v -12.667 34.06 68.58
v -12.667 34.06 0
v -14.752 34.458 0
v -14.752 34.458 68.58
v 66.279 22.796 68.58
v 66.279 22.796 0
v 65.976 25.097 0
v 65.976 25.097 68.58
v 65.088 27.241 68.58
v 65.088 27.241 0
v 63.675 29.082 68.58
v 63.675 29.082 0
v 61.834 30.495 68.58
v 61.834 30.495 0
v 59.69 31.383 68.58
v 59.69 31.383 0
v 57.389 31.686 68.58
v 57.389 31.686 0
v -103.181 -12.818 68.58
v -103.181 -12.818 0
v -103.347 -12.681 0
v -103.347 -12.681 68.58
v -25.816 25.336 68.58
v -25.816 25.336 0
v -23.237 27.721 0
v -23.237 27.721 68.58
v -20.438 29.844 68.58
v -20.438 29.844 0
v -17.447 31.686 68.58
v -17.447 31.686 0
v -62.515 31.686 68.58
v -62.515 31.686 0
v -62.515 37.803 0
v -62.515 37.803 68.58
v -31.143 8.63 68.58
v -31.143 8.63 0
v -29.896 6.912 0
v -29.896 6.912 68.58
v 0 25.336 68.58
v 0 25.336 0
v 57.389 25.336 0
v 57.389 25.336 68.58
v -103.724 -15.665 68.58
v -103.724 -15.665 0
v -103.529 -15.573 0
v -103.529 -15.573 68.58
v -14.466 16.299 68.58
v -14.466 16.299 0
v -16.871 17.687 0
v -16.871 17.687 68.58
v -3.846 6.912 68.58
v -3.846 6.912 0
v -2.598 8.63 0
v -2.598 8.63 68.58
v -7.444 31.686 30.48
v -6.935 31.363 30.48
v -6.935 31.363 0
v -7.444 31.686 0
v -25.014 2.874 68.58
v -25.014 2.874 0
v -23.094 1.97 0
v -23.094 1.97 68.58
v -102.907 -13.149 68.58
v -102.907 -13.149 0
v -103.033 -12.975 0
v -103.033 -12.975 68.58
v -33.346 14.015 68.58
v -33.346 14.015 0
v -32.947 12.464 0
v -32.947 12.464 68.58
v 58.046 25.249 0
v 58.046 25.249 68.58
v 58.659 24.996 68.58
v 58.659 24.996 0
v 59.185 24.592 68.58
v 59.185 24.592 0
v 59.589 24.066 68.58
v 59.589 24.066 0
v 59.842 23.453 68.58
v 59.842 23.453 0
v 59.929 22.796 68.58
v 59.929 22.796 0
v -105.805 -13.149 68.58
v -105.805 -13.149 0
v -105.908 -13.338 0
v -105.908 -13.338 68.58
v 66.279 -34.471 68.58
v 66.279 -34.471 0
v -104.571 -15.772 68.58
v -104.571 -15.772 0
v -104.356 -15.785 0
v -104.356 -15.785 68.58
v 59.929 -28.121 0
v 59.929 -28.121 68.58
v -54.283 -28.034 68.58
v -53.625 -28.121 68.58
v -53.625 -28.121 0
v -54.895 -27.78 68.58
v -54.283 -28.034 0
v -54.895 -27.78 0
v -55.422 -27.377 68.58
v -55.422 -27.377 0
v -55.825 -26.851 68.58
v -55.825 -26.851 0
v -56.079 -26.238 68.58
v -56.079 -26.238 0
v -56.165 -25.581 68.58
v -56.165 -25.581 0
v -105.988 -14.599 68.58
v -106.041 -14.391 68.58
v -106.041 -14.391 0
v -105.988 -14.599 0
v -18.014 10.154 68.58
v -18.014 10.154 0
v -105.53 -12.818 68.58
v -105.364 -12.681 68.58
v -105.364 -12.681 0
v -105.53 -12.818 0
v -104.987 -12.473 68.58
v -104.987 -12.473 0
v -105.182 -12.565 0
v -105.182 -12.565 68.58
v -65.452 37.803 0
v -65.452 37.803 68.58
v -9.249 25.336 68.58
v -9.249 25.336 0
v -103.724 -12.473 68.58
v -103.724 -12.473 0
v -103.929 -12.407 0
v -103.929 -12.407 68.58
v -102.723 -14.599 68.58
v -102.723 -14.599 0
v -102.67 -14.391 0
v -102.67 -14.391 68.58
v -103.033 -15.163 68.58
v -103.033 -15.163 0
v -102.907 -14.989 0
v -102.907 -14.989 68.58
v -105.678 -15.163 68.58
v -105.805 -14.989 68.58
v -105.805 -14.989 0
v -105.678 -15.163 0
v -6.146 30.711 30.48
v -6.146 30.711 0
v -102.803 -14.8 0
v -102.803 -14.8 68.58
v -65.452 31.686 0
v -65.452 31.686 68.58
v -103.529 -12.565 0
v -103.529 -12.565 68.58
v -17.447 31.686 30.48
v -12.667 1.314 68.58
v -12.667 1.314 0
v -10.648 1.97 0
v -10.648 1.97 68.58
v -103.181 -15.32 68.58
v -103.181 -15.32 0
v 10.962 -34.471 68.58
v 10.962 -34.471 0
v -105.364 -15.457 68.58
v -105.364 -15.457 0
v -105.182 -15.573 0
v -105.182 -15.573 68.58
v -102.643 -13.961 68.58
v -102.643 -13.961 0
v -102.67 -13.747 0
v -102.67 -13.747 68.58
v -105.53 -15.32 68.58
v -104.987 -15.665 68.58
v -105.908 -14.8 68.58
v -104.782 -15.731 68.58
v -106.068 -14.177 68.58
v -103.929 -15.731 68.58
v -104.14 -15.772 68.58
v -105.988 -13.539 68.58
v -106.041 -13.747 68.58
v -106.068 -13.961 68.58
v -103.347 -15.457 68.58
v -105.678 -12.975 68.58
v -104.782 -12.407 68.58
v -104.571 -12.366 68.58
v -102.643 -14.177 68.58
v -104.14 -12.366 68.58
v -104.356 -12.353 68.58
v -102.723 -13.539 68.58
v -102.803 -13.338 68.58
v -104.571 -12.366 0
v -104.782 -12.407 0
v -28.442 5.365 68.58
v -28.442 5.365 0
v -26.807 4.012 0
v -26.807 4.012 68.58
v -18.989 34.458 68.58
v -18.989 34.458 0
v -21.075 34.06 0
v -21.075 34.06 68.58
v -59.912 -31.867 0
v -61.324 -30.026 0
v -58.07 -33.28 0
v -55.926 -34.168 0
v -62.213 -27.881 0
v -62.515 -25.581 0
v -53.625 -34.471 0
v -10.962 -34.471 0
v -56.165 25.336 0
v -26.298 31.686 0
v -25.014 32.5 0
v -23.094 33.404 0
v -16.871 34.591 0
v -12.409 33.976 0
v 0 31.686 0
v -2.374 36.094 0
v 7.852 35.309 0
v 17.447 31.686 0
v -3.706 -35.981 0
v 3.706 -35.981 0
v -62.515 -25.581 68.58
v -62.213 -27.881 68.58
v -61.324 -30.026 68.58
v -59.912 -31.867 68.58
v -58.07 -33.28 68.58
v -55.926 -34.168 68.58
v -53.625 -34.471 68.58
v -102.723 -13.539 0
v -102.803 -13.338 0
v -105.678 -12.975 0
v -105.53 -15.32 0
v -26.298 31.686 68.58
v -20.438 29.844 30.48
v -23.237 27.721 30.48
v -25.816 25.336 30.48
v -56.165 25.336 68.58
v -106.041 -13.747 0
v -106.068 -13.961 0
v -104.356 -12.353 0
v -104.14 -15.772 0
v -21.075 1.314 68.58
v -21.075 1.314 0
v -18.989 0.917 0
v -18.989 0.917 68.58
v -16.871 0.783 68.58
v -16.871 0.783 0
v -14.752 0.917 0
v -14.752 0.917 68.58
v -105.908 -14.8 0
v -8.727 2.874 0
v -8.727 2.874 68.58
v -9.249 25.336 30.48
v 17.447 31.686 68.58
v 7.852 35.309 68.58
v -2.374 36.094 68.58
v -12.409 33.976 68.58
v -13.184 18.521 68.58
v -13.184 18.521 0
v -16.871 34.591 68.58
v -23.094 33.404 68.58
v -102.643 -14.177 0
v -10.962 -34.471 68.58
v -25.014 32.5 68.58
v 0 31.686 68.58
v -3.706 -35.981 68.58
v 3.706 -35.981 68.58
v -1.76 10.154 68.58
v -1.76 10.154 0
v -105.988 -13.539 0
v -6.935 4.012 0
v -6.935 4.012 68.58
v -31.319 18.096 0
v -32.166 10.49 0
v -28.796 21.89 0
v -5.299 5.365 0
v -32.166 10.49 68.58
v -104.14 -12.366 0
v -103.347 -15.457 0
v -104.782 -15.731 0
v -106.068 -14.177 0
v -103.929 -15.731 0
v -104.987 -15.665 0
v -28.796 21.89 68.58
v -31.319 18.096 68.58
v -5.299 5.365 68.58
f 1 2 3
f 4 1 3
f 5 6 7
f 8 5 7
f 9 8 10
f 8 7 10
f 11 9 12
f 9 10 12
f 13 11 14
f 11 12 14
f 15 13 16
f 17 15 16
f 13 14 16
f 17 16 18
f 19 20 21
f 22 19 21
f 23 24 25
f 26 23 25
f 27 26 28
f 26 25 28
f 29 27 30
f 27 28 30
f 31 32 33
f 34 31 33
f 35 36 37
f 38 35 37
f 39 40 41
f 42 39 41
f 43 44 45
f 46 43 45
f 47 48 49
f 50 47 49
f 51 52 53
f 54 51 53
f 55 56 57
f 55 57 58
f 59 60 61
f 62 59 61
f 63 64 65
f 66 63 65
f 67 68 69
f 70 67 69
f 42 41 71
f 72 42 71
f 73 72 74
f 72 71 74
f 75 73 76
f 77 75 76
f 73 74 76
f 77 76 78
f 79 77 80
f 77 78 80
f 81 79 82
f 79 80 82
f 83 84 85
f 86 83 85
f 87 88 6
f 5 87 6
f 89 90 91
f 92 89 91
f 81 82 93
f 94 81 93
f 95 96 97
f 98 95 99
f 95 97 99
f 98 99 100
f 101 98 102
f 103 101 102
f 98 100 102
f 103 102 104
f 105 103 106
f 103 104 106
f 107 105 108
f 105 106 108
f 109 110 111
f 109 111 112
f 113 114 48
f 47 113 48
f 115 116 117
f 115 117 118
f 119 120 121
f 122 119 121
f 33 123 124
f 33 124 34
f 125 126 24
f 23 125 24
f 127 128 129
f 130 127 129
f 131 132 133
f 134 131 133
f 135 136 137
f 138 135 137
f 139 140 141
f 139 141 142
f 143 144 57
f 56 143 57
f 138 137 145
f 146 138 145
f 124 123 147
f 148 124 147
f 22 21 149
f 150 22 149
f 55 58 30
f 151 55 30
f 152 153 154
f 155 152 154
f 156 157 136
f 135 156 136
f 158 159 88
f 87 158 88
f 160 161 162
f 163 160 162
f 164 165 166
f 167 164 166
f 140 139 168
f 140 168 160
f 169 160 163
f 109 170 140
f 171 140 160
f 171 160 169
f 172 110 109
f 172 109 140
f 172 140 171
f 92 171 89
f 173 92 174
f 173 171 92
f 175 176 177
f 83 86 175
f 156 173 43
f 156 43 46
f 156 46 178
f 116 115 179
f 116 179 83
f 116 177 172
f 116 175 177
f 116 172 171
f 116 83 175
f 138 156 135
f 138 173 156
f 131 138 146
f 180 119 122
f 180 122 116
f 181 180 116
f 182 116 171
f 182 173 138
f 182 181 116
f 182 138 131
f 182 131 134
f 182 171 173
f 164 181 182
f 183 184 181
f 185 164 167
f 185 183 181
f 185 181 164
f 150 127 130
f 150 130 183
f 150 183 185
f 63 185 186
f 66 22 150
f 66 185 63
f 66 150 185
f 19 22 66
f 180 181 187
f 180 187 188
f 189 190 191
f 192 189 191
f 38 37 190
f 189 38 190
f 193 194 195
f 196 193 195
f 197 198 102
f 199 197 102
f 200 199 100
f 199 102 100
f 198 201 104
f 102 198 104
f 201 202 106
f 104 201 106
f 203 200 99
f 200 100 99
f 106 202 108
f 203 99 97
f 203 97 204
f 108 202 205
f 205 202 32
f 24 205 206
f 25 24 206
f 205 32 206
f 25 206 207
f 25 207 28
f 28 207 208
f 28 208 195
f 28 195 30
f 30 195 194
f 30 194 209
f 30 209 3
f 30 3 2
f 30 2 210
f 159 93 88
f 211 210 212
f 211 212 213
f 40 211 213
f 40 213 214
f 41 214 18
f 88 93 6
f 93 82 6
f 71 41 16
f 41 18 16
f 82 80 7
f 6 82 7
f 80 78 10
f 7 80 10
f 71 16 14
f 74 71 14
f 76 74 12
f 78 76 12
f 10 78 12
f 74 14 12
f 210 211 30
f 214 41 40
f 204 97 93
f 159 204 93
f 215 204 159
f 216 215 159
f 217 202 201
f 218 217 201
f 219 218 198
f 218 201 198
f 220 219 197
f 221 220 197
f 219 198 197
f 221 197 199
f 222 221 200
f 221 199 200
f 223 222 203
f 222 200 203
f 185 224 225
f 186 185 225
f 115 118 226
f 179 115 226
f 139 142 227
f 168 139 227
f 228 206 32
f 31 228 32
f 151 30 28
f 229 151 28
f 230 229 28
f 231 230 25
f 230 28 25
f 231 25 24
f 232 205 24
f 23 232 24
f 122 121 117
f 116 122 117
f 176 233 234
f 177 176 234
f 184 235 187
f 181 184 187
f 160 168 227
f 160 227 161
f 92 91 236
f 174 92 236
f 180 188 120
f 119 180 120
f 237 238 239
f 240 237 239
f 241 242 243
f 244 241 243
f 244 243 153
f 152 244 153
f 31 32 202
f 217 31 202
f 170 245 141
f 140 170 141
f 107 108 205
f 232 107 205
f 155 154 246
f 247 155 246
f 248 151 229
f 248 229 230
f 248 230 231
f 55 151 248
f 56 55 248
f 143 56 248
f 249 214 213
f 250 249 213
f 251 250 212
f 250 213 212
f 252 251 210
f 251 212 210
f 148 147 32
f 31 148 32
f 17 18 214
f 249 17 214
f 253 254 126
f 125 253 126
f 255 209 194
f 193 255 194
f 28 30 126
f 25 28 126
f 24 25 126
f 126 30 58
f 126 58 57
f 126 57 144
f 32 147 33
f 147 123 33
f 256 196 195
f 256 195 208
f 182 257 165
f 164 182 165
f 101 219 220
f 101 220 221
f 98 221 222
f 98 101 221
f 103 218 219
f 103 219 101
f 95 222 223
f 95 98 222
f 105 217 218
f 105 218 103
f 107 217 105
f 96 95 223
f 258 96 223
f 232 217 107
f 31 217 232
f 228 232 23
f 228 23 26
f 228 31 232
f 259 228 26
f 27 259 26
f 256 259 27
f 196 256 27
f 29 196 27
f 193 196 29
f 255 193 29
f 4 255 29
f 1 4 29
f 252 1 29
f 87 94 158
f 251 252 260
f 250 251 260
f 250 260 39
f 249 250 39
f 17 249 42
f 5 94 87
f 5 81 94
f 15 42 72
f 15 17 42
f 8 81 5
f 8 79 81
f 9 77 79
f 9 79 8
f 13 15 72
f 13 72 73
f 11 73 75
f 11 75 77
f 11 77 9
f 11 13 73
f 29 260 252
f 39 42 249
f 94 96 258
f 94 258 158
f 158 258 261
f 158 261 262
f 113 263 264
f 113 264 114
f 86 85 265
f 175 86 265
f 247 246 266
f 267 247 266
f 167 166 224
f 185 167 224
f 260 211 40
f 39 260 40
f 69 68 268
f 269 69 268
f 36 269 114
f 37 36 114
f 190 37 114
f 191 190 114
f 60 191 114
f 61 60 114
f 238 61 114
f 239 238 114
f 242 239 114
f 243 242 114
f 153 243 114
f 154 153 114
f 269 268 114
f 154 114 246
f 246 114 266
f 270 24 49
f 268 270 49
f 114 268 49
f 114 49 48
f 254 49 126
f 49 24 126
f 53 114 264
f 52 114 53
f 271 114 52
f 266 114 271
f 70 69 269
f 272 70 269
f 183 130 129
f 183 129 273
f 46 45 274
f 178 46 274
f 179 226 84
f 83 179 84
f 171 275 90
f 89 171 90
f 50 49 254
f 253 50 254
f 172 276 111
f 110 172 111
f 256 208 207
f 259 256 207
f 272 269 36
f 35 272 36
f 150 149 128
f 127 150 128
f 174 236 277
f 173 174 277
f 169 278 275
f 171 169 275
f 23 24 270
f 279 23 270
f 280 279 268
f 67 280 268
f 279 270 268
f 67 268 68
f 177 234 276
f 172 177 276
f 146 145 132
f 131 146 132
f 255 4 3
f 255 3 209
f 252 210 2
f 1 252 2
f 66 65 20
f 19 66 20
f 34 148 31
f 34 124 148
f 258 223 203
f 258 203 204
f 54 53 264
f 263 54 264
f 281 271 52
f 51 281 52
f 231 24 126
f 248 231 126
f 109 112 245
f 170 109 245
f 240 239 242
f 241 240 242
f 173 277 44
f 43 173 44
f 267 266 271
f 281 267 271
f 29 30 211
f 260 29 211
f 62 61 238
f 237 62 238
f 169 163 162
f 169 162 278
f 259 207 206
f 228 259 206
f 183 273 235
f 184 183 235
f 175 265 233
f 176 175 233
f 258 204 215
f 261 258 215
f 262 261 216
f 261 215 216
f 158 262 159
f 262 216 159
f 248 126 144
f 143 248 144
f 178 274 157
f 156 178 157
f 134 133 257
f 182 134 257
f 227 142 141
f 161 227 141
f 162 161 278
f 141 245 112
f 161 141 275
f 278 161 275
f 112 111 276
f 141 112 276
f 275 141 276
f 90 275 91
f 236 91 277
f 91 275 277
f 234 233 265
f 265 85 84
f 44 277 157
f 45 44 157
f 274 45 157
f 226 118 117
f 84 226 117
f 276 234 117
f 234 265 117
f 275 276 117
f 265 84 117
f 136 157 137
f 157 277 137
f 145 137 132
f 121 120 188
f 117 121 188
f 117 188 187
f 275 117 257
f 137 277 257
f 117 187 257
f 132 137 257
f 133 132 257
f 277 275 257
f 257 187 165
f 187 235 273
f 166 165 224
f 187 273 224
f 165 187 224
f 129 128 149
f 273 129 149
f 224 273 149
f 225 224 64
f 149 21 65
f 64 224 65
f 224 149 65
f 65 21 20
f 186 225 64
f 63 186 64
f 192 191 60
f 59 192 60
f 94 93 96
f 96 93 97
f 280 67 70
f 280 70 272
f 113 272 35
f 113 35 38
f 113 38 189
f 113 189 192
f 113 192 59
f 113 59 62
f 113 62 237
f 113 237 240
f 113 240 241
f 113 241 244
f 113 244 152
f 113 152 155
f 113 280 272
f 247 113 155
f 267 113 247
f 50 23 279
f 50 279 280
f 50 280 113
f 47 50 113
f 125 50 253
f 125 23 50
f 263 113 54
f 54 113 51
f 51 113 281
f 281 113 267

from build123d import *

# Parameters (mm, degrees)
F1_DEPTH = 25.4
F0_W     = 2.9361471534
F0_H     = 3.0584856868
F2_DEPTH = 25.4
F3_DEPTH = 68.58
F4_DEPTH = 30.48


# Not quite as in the source:
# - the program builds the solid bodies; features that only make, move or delete a surface that nothing else refers to are left out


with BuildPart() as f1:
    # F0 (on Top) → F1 (new body)
    with BuildSketch(Plane.XY):
        Polygon((-62.5154599547, 0), (-56.1654599547, 0), (-56.1654599547, 25.3359185696), (-31.9179130904, 25.3359185696), (-31.1432781089, 26.7449743701), (-29.895510103, 28.4623796944), (-28.4423331579, 30.0098559658), (-26.8066647421, 31.3629985591), (-26.2978242266, 31.6859185696), (-62.5154599547, 31.6859185696), align=None)
    extrude(amount=F1_DEPTH)

    # F0 (on Top) → F2 (join)
    with BuildSketch(Plane.XY):
        with BuildLine():
            Line((0, 25.3359185696), (25.8161057919, 25.3359185696))
            ThreePointArc((25.8161057919, 25.3359185696), (21.8631038448, 28.8163977328), (17.4465656341, 31.6859185696))
            Line((17.4465656341, 31.6859185696), (0, 31.6859185696))
            Line((0, 31.6859185696), (0, 25.3359185696))
        make_face()
        with BuildLine():
            ThreePointArc((17.4465656341, 31.6859185696), (21.8631038448, 28.8163977328), (25.8161057919, 25.3359185696))
            Line((25.8161057919, 25.3359185696), (57.3888527393, 25.3359185696))
            ThreePointArc((57.3888527393, 25.3359185696), (59.1849039635, 24.5919697938), (59.9288527393, 22.7959185696))
            Line((59.9288527393, 22.7959185696), (59.9288527393, 0))
            Line((59.9288527393, 0), (66.2788527393, 0))
            Line((66.2788527393, 0), (66.2788527393, 22.7959185696))
            ThreePointArc((66.2788527393, 22.7959185696), (63.6750320241, 29.0820978543), (57.3888527393, 31.6859185696))
            Line((57.3888527393, 31.6859185696), (17.4465656341, 31.6859185696))
        make_face()
        with BuildLine():
            Line((59.9288527393, -28.1205956364), (22.7510920415, -28.1205956364))
            ThreePointArc((22.7510920415, -28.1205956364), (17.1527881407, -31.8459094237), (10.9616661369, -34.4705956364))
            Line((10.9616661369, -34.4705956364), (66.2788527393, -34.4705956364))
            Line((66.2788527393, -34.4705956364), (66.2788527393, 0))
            Line((66.2788527393, 0), (59.9288527393, 0))
            Line((59.9288527393, 0), (59.9288527393, -28.1205956364))
        make_face()
        with BuildLine():
            ThreePointArc((10.9616661369, -34.4705956364), (17.1527881407, -31.8459094237), (22.7510920415, -28.1205956364))
            Line((22.7510920415, -28.1205956364), (0, -28.1205956364))
            Line((0, -28.1205956364), (0, -34.4705956364))
            Line((0, -34.4705956364), (10.9616661369, -34.4705956364))
        make_face()
        with BuildLine():
            Line((0, 31.6859185696), (17.4465656341, 31.6859185696))
            ThreePointArc((17.4465656341, 31.6859185696), (2.7670174678, 36.0655473043), (-12.4088213224, 33.9764807096))
            Line((-12.4088213224, 33.9764807096), (-10.6479057106, 33.404324544))
            Line((-10.6479057106, 33.404324544), (-8.727111947, 32.5004676073))
            Line((-8.727111947, 32.5004676073), (-7.4435880441, 31.6859185696))
            Line((-7.4435880441, 31.6859185696), (0, 31.6859185696))
        make_face()
        with Locations((-63.9835335314, 33.215161413)):
            Rectangle(F0_W, F0_H)
        with BuildLine():
            ThreePointArc((-10.9616661369, -34.4705956364), (0, -36.1715369873), (10.9616661369, -34.4705956364))
            Line((10.9616661369, -34.4705956364), (0, -34.4705956364))
            Line((0, -34.4705956364), (-10.9616661369, -34.4705956364))
        make_face()
        with BuildLine():
            Line((0, -34.4705956364), (0, -28.1205956364))
            Line((0, -28.1205956364), (-22.7510920415, -28.1205956364))
            ThreePointArc((-22.7510920415, -28.1205956364), (-17.1527881407, -31.8459094237), (-10.9616661369, -34.4705956364))
            Line((-10.9616661369, -34.4705956364), (0, -34.4705956364))
        make_face()
        with BuildLine():
            Line((-10.6479057106, 33.404324544), (-12.4088213224, 33.9764807096))
            ThreePointArc((-12.4088213224, 33.9764807096), (-14.9715630884, 32.9276841991), (-17.4465656341, 31.6859185696))
            Line((-17.4465656341, 31.6859185696), (-7.4435880441, 31.6859185696))
            Line((-7.4435880441, 31.6859185696), (-8.727111947, 32.5004676073))
            Line((-8.727111947, 32.5004676073), (-10.6479057106, 33.404324544))
        make_face()
        with BuildLine():
            ThreePointArc((-17.4465656341, 31.6859185696), (-14.9715630884, 32.9276841991), (-12.4088213224, 33.9764807096))
            Line((-12.4088213224, 33.9764807096), (-12.6668367542, 34.0603150054))
            Line((-12.6668367542, 34.0603150054), (-14.7520653292, 34.45809363))
            Line((-14.7520653292, 34.45809363), (-16.8707061353, 34.5913872114))
            Line((-16.8707061353, 34.5913872114), (-18.9893469415, 34.45809363))
            Line((-18.9893469415, 34.45809363), (-21.0745755165, 34.0603150054))
            Line((-21.0745755165, 34.0603150054), (-23.0935065601, 33.404324544))
            Line((-23.0935065601, 33.404324544), (-25.0143003236, 32.5004676073))
            Line((-25.0143003236, 32.5004676073), (-26.2978242266, 31.6859185696))
            Line((-26.2978242266, 31.6859185696), (-17.4465656341, 31.6859185696))
        make_face()
        with BuildLine():
            Line((-53.6254599547, -34.4705956364), (-10.9616661369, -34.4705956364))
            ThreePointArc((-10.9616661369, -34.4705956364), (-17.1527881407, -31.8459094237), (-22.7510920415, -28.1205956364))
            Line((-22.7510920415, -28.1205956364), (-53.6254599547, -28.1205956364))
            ThreePointArc((-53.6254599547, -28.1205956364), (-55.421511179, -27.3766468606), (-56.1654599547, -25.5805956364))
            Line((-56.1654599547, -25.5805956364), (-56.1654599547, 0))
            Line((-56.1654599547, 0), (-62.5154599547, 0))
            Line((-62.5154599547, 0), (-62.5154599547, -25.5805956364))
            ThreePointArc((-62.5154599547, -25.5805956364), (-59.9116392395, -31.8667749211), (-53.6254599547, -34.4705956364))
        make_face()
        Polygon((-62.5154599547, 0), (-56.1654599547, 0), (-56.1654599547, 25.3359185696), (-31.9179130904, 25.3359185696), (-31.1432781089, 26.7449743701), (-29.895510103, 28.4623796944), (-28.4423331579, 30.0098559658), (-26.8066647421, 31.3629985591), (-26.2978242266, 31.6859185696), (-62.5154599547, 31.6859185696), align=None)
        with BuildLine():
            ThreePointArc((-25.8161057919, 25.3359185696), (-21.8631038448, 28.8163977328), (-17.4465656341, 31.6859185696))
            Line((-17.4465656341, 31.6859185696), (-26.2978242266, 31.6859185696))
            Line((-26.2978242266, 31.6859185696), (-26.8066647421, 31.3629985591))
            Line((-26.8066647421, 31.3629985591), (-28.4423331579, 30.0098559658))
            Line((-28.4423331579, 30.0098559658), (-29.895510103, 28.4623796944))
            Line((-29.895510103, 28.4623796944), (-31.1432781089, 26.7449743701))
            Line((-31.1432781089, 26.7449743701), (-31.9179130904, 25.3359185696))
            Line((-31.9179130904, 25.3359185696), (-25.8161057919, 25.3359185696))
        make_face()
        with Locations((-63.9835335314, 36.2736470997)):
            Rectangle(F0_W, F0_H)
    extrude(amount=F2_DEPTH)

    # F0 (on Top) → F3, piece 2 (join)
    with BuildSketch(Plane.XY):
        with BuildLine():
            Line((0, 25.3359185696), (25.8161057919, 25.3359185696))
            ThreePointArc((25.8161057919, 25.3359185696), (21.8631038448, 28.8163977328), (17.4465656341, 31.6859185696))
            Line((17.4465656341, 31.6859185696), (0, 31.6859185696))
            Line((0, 31.6859185696), (0, 25.3359185696))
        make_face()
        with BuildLine():
            ThreePointArc((17.4465656341, 31.6859185696), (21.8631038448, 28.8163977328), (25.8161057919, 25.3359185696))
            Line((25.8161057919, 25.3359185696), (57.3888527393, 25.3359185696))
            ThreePointArc((57.3888527393, 25.3359185696), (59.1849039635, 24.5919697938), (59.9288527393, 22.7959185696))
            Line((59.9288527393, 22.7959185696), (59.9288527393, 0))
            Line((59.9288527393, 0), (66.2788527393, 0))
            Line((66.2788527393, 0), (66.2788527393, 22.7959185696))
            ThreePointArc((66.2788527393, 22.7959185696), (63.6750320241, 29.0820978543), (57.3888527393, 31.6859185696))
            Line((57.3888527393, 31.6859185696), (17.4465656341, 31.6859185696))
        make_face()
        with BuildLine():
            Line((59.9288527393, -28.1205956364), (22.7510920415, -28.1205956364))
            ThreePointArc((22.7510920415, -28.1205956364), (17.1527881407, -31.8459094237), (10.9616661369, -34.4705956364))
            Line((10.9616661369, -34.4705956364), (66.2788527393, -34.4705956364))
            Line((66.2788527393, -34.4705956364), (66.2788527393, 0))
            Line((66.2788527393, 0), (59.9288527393, 0))
            Line((59.9288527393, 0), (59.9288527393, -28.1205956364))
        make_face()
        with BuildLine():
            ThreePointArc((10.9616661369, -34.4705956364), (17.1527881407, -31.8459094237), (22.7510920415, -28.1205956364))
            Line((22.7510920415, -28.1205956364), (0, -28.1205956364))
            Line((0, -28.1205956364), (0, -34.4705956364))
            Line((0, -34.4705956364), (10.9616661369, -34.4705956364))
        make_face()
        with BuildLine():
            Line((0, 31.6859185696), (17.4465656341, 31.6859185696))
            ThreePointArc((17.4465656341, 31.6859185696), (2.7670174678, 36.0655473043), (-12.4088213224, 33.9764807096))
            Line((-12.4088213224, 33.9764807096), (-10.6479057106, 33.404324544))
            Line((-10.6479057106, 33.404324544), (-8.727111947, 32.5004676073))
            Line((-8.727111947, 32.5004676073), (-7.4435880441, 31.6859185696))
            Line((-7.4435880441, 31.6859185696), (0, 31.6859185696))
        make_face()
        with Locations((-63.9835335314, 33.215161413)):
            Rectangle(F0_W, F0_H)
        with BuildLine():
            ThreePointArc((-10.9616661369, -34.4705956364), (0, -36.1715369873), (10.9616661369, -34.4705956364))
            Line((10.9616661369, -34.4705956364), (0, -34.4705956364))
            Line((0, -34.4705956364), (-10.9616661369, -34.4705956364))
        make_face()
        with BuildLine():
            Line((0, -34.4705956364), (0, -28.1205956364))
            Line((0, -28.1205956364), (-22.7510920415, -28.1205956364))
            ThreePointArc((-22.7510920415, -28.1205956364), (-17.1527881407, -31.8459094237), (-10.9616661369, -34.4705956364))
            Line((-10.9616661369, -34.4705956364), (0, -34.4705956364))
        make_face()
        with BuildLine():
            Line((-10.6479057106, 33.404324544), (-12.4088213224, 33.9764807096))
            ThreePointArc((-12.4088213224, 33.9764807096), (-14.9715630884, 32.9276841991), (-17.4465656341, 31.6859185696))
            Line((-17.4465656341, 31.6859185696), (-7.4435880441, 31.6859185696))
            Line((-7.4435880441, 31.6859185696), (-8.727111947, 32.5004676073))
            Line((-8.727111947, 32.5004676073), (-10.6479057106, 33.404324544))
        make_face()
        with BuildLine():
            ThreePointArc((-17.4465656341, 31.6859185696), (-14.9715630884, 32.9276841991), (-12.4088213224, 33.9764807096))
            Line((-12.4088213224, 33.9764807096), (-12.6668367542, 34.0603150054))
            Line((-12.6668367542, 34.0603150054), (-14.7520653292, 34.45809363))
            Line((-14.7520653292, 34.45809363), (-16.8707061353, 34.5913872114))
            Line((-16.8707061353, 34.5913872114), (-18.9893469415, 34.45809363))
            Line((-18.9893469415, 34.45809363), (-21.0745755165, 34.0603150054))
            Line((-21.0745755165, 34.0603150054), (-23.0935065601, 33.404324544))
            Line((-23.0935065601, 33.404324544), (-25.0143003236, 32.5004676073))
            Line((-25.0143003236, 32.5004676073), (-26.2978242266, 31.6859185696))
            Line((-26.2978242266, 31.6859185696), (-17.4465656341, 31.6859185696))
        make_face()
        with BuildLine():
            Line((-53.6254599547, -34.4705956364), (-10.9616661369, -34.4705956364))
            ThreePointArc((-10.9616661369, -34.4705956364), (-17.1527881407, -31.8459094237), (-22.7510920415, -28.1205956364))
            Line((-22.7510920415, -28.1205956364), (-53.6254599547, -28.1205956364))
            ThreePointArc((-53.6254599547, -28.1205956364), (-55.421511179, -27.3766468606), (-56.1654599547, -25.5805956364))
            Line((-56.1654599547, -25.5805956364), (-56.1654599547, 0))
            Line((-56.1654599547, 0), (-62.5154599547, 0))
            Line((-62.5154599547, 0), (-62.5154599547, -25.5805956364))
            ThreePointArc((-62.5154599547, -25.5805956364), (-59.9116392395, -31.8667749211), (-53.6254599547, -34.4705956364))
        make_face()
        Polygon((-62.5154599547, 0), (-56.1654599547, 0), (-56.1654599547, 25.3359185696), (-31.9179130904, 25.3359185696), (-31.1432781089, 26.7449743701), (-29.895510103, 28.4623796944), (-28.4423331579, 30.0098559658), (-26.8066647421, 31.3629985591), (-26.2978242266, 31.6859185696), (-62.5154599547, 31.6859185696), align=None)
        with BuildLine():
            ThreePointArc((-25.8161057919, 25.3359185696), (-21.8631038448, 28.8163977328), (-17.4465656341, 31.6859185696))
            Line((-17.4465656341, 31.6859185696), (-26.2978242266, 31.6859185696))
            Line((-26.2978242266, 31.6859185696), (-26.8066647421, 31.3629985591))
            Line((-26.8066647421, 31.3629985591), (-28.4423331579, 30.0098559658))
            Line((-28.4423331579, 30.0098559658), (-29.895510103, 28.4623796944))
            Line((-29.895510103, 28.4623796944), (-31.1432781089, 26.7449743701))
            Line((-31.1432781089, 26.7449743701), (-31.9179130904, 25.3359185696))
            Line((-31.9179130904, 25.3359185696), (-25.8161057919, 25.3359185696))
        make_face()
        with Locations((-63.9835335314, 36.2736470997)):
            Rectangle(F0_W, F0_H)
        with BuildLine():
            ThreePointArc((-25.8161057919, 25.3359185696), (-30.1176460126, 20.0326604994), (-33.3458594379, 14.015482381))
            Line((-33.3458594379, 14.015482381), (-32.9474248719, 12.4636822018))
            Line((-32.9474248719, 12.4636822018), (-32.1659591287, 10.4899250394))
            Line((-32.1659591287, 10.4899250394), (-31.1432781089, 8.6296751702))
            Line((-31.1432781089, 8.6296751702), (-29.895510103, 6.9122698459))
            Line((-29.895510103, 6.9122698459), (-28.4423331579, 5.3647935745))
            Line((-28.4423331579, 5.3647935745), (-26.8066647421, 4.0116509812))
            Line((-26.8066647421, 4.0116509812), (-25.0143003236, 2.8741819331))
            Line((-25.0143003236, 2.8741819331), (-23.0935065601, 1.9703249963))
            Line((-23.0935065601, 1.9703249963), (-21.0745755165, 1.3143345349))
            Line((-21.0745755165, 1.3143345349), (-18.9893469415, 0.9165559103))
            Line((-18.9893469415, 0.9165559103), (-16.8707061353, 0.783262329))
            Line((-16.8707061353, 0.783262329), (-14.7520653292, 0.9165559103))
            Line((-14.7520653292, 0.9165559103), (-12.6668367542, 1.3143345349))
            Line((-12.6668367542, 1.3143345349), (-10.6479057106, 1.9703249963))
            Line((-10.6479057106, 1.9703249963), (-8.727111947, 2.8741819331))
            Line((-8.727111947, 2.8741819331), (-6.9347475286, 4.0116509812))
            Line((-6.9347475286, 4.0116509812), (-5.2990791128, 5.3647935745))
            Line((-5.2990791128, 5.3647935745), (-3.8459021677, 6.9122698459))
            Line((-3.8459021677, 6.9122698459), (-2.5981341618, 8.6296751702))
            Line((-2.5981341618, 8.6296751702), (-1.7600334856, 10.1541746408))
            Line((-1.7600334856, 10.1541746408), (-18.0142852782, 10.1541746408))
            Line((-18.0142852782, 10.1541746408), (-14.4664408012, 16.2992215323))
            Line((-14.4664408012, 16.2992215323), (-16.8707061353, 17.6873247702))
            Line((-16.8707061353, 17.6873247702), (-13.1839158222, 18.5206199579))
            Line((-13.1839158222, 18.5206199579), (-9.2491013341, 25.3359185696))
            Line((-9.2491013341, 25.3359185696), (-25.8161057919, 25.3359185696))
        make_face()
    extrude(amount=F3_DEPTH)


with BuildPart() as f2:
    # F0 (on Top) → F2, piece 2 (new body)
    with BuildSketch(Plane.XY):
        Polygon((-102.6427969337, -14.1767939518), (-102.6427969337, -13.9612792094), (-102.6698080932, -13.7474638651), (-102.7234044302, -13.5387199147), (-102.8027406983, -13.3383393748), (-102.9065657173, -13.1494823664), (-103.0332421045, -12.9751272773), (-103.1807720977, -12.8180237913), (-103.3468290607, -12.6806495244), (-103.5287941761, -12.5651709507), (-103.7237977452, -12.4734092363), (-103.9287644453, -12.4068115184), (-104.1404618291, -12.3664280827), (-104.3555513024, -12.3528958), (-104.5706407757, -12.3664280827), (-104.7823381595, -12.4068115184), (-104.9873048596, -12.4734092363), (-105.1823084288, -12.5651709507), (-105.3642735441, -12.6806495244), (-105.5303305072, -12.8180237913), (-105.6778605004, -12.9751272773), (-105.8045368876, -13.1494823664), (-105.9083619066, -13.3383393748), (-105.9876981747, -13.5387199147), (-106.0412945117, -13.7474638651), (-106.0683056712, -13.9612792094), (-106.0683056712, -14.1767939518), (-106.0412945117, -14.3906092961), (-105.9876981747, -14.5993532466), (-105.9083619066, -14.7997337864), (-105.8045368876, -14.9885907948), (-105.6778605004, -15.162945884), (-105.5303305072, -15.3200493699), (-105.3642735441, -15.4574236369), (-105.1823084288, -15.5729022106), (-104.9873048596, -15.6646639249), (-104.7823381595, -15.7312616428), (-104.5706407757, -15.7716450786), (-104.3555513024, -15.7851773612), (-104.1404618291, -15.7716450786), (-103.9287644453, -15.7312616428), (-103.7237977452, -15.6646639249), (-103.5287941761, -15.5729022106), (-103.3468290607, -15.4574236369), (-103.1807720977, -15.3200493699), (-103.0332421045, -15.162945884), (-102.9065657173, -14.9885907948), (-102.8027406983, -14.7997337864), (-102.7234044302, -14.5993532466), (-102.6698080932, -14.3906092961), align=None)
    extrude(amount=F2_DEPTH)

    # F0 (on Top) → F3 (join)
    with BuildSketch(Plane.XY):
        Polygon((-102.6427969337, -14.1767939518), (-102.6427969337, -13.9612792094), (-102.6698080932, -13.7474638651), (-102.7234044302, -13.5387199147), (-102.8027406983, -13.3383393748), (-102.9065657173, -13.1494823664), (-103.0332421045, -12.9751272773), (-103.1807720977, -12.8180237913), (-103.3468290607, -12.6806495244), (-103.5287941761, -12.5651709507), (-103.7237977452, -12.4734092363), (-103.9287644453, -12.4068115184), (-104.1404618291, -12.3664280827), (-104.3555513024, -12.3528958), (-104.5706407757, -12.3664280827), (-104.7823381595, -12.4068115184), (-104.9873048596, -12.4734092363), (-105.1823084288, -12.5651709507), (-105.3642735441, -12.6806495244), (-105.5303305072, -12.8180237913), (-105.6778605004, -12.9751272773), (-105.8045368876, -13.1494823664), (-105.9083619066, -13.3383393748), (-105.9876981747, -13.5387199147), (-106.0412945117, -13.7474638651), (-106.0683056712, -13.9612792094), (-106.0683056712, -14.1767939518), (-106.0412945117, -14.3906092961), (-105.9876981747, -14.5993532466), (-105.9083619066, -14.7997337864), (-105.8045368876, -14.9885907948), (-105.6778605004, -15.162945884), (-105.5303305072, -15.3200493699), (-105.3642735441, -15.4574236369), (-105.1823084288, -15.5729022106), (-104.9873048596, -15.6646639249), (-104.7823381595, -15.7312616428), (-104.5706407757, -15.7716450786), (-104.3555513024, -15.7851773612), (-104.1404618291, -15.7716450786), (-103.9287644453, -15.7312616428), (-103.7237977452, -15.6646639249), (-103.5287941761, -15.5729022106), (-103.3468290607, -15.4574236369), (-103.1807720977, -15.3200493699), (-103.0332421045, -15.162945884), (-102.9065657173, -14.9885907948), (-102.8027406983, -14.7997337864), (-102.7234044302, -14.5993532466), (-102.6698080932, -14.3906092961), align=None)
    extrude(amount=F3_DEPTH)


with BuildPart() as f4:
    # F0 (on Top) → F4 (new body)
    with BuildSketch(Plane.XY):
        with BuildLine():
            Line((-7.4435880441, 31.6859185696), (-17.4465656341, 31.6859185696))
            ThreePointArc((-17.4465656341, 31.6859185696), (-21.8631038448, 28.8163977328), (-25.8161057919, 25.3359185696))
            Line((-25.8161057919, 25.3359185696), (-9.2491013341, 25.3359185696))
            Line((-9.2491013341, 25.3359185696), (-6.1460616902, 30.7105408908))
            Line((-6.1460616902, 30.7105408908), (-6.9347475286, 31.3629985591))
            Line((-6.9347475286, 31.3629985591), (-7.4435880441, 31.6859185696))
        make_face()
    extrude(amount=F4_DEPTH)


solid = Compound([f1.part, f2.part, f4.part])
